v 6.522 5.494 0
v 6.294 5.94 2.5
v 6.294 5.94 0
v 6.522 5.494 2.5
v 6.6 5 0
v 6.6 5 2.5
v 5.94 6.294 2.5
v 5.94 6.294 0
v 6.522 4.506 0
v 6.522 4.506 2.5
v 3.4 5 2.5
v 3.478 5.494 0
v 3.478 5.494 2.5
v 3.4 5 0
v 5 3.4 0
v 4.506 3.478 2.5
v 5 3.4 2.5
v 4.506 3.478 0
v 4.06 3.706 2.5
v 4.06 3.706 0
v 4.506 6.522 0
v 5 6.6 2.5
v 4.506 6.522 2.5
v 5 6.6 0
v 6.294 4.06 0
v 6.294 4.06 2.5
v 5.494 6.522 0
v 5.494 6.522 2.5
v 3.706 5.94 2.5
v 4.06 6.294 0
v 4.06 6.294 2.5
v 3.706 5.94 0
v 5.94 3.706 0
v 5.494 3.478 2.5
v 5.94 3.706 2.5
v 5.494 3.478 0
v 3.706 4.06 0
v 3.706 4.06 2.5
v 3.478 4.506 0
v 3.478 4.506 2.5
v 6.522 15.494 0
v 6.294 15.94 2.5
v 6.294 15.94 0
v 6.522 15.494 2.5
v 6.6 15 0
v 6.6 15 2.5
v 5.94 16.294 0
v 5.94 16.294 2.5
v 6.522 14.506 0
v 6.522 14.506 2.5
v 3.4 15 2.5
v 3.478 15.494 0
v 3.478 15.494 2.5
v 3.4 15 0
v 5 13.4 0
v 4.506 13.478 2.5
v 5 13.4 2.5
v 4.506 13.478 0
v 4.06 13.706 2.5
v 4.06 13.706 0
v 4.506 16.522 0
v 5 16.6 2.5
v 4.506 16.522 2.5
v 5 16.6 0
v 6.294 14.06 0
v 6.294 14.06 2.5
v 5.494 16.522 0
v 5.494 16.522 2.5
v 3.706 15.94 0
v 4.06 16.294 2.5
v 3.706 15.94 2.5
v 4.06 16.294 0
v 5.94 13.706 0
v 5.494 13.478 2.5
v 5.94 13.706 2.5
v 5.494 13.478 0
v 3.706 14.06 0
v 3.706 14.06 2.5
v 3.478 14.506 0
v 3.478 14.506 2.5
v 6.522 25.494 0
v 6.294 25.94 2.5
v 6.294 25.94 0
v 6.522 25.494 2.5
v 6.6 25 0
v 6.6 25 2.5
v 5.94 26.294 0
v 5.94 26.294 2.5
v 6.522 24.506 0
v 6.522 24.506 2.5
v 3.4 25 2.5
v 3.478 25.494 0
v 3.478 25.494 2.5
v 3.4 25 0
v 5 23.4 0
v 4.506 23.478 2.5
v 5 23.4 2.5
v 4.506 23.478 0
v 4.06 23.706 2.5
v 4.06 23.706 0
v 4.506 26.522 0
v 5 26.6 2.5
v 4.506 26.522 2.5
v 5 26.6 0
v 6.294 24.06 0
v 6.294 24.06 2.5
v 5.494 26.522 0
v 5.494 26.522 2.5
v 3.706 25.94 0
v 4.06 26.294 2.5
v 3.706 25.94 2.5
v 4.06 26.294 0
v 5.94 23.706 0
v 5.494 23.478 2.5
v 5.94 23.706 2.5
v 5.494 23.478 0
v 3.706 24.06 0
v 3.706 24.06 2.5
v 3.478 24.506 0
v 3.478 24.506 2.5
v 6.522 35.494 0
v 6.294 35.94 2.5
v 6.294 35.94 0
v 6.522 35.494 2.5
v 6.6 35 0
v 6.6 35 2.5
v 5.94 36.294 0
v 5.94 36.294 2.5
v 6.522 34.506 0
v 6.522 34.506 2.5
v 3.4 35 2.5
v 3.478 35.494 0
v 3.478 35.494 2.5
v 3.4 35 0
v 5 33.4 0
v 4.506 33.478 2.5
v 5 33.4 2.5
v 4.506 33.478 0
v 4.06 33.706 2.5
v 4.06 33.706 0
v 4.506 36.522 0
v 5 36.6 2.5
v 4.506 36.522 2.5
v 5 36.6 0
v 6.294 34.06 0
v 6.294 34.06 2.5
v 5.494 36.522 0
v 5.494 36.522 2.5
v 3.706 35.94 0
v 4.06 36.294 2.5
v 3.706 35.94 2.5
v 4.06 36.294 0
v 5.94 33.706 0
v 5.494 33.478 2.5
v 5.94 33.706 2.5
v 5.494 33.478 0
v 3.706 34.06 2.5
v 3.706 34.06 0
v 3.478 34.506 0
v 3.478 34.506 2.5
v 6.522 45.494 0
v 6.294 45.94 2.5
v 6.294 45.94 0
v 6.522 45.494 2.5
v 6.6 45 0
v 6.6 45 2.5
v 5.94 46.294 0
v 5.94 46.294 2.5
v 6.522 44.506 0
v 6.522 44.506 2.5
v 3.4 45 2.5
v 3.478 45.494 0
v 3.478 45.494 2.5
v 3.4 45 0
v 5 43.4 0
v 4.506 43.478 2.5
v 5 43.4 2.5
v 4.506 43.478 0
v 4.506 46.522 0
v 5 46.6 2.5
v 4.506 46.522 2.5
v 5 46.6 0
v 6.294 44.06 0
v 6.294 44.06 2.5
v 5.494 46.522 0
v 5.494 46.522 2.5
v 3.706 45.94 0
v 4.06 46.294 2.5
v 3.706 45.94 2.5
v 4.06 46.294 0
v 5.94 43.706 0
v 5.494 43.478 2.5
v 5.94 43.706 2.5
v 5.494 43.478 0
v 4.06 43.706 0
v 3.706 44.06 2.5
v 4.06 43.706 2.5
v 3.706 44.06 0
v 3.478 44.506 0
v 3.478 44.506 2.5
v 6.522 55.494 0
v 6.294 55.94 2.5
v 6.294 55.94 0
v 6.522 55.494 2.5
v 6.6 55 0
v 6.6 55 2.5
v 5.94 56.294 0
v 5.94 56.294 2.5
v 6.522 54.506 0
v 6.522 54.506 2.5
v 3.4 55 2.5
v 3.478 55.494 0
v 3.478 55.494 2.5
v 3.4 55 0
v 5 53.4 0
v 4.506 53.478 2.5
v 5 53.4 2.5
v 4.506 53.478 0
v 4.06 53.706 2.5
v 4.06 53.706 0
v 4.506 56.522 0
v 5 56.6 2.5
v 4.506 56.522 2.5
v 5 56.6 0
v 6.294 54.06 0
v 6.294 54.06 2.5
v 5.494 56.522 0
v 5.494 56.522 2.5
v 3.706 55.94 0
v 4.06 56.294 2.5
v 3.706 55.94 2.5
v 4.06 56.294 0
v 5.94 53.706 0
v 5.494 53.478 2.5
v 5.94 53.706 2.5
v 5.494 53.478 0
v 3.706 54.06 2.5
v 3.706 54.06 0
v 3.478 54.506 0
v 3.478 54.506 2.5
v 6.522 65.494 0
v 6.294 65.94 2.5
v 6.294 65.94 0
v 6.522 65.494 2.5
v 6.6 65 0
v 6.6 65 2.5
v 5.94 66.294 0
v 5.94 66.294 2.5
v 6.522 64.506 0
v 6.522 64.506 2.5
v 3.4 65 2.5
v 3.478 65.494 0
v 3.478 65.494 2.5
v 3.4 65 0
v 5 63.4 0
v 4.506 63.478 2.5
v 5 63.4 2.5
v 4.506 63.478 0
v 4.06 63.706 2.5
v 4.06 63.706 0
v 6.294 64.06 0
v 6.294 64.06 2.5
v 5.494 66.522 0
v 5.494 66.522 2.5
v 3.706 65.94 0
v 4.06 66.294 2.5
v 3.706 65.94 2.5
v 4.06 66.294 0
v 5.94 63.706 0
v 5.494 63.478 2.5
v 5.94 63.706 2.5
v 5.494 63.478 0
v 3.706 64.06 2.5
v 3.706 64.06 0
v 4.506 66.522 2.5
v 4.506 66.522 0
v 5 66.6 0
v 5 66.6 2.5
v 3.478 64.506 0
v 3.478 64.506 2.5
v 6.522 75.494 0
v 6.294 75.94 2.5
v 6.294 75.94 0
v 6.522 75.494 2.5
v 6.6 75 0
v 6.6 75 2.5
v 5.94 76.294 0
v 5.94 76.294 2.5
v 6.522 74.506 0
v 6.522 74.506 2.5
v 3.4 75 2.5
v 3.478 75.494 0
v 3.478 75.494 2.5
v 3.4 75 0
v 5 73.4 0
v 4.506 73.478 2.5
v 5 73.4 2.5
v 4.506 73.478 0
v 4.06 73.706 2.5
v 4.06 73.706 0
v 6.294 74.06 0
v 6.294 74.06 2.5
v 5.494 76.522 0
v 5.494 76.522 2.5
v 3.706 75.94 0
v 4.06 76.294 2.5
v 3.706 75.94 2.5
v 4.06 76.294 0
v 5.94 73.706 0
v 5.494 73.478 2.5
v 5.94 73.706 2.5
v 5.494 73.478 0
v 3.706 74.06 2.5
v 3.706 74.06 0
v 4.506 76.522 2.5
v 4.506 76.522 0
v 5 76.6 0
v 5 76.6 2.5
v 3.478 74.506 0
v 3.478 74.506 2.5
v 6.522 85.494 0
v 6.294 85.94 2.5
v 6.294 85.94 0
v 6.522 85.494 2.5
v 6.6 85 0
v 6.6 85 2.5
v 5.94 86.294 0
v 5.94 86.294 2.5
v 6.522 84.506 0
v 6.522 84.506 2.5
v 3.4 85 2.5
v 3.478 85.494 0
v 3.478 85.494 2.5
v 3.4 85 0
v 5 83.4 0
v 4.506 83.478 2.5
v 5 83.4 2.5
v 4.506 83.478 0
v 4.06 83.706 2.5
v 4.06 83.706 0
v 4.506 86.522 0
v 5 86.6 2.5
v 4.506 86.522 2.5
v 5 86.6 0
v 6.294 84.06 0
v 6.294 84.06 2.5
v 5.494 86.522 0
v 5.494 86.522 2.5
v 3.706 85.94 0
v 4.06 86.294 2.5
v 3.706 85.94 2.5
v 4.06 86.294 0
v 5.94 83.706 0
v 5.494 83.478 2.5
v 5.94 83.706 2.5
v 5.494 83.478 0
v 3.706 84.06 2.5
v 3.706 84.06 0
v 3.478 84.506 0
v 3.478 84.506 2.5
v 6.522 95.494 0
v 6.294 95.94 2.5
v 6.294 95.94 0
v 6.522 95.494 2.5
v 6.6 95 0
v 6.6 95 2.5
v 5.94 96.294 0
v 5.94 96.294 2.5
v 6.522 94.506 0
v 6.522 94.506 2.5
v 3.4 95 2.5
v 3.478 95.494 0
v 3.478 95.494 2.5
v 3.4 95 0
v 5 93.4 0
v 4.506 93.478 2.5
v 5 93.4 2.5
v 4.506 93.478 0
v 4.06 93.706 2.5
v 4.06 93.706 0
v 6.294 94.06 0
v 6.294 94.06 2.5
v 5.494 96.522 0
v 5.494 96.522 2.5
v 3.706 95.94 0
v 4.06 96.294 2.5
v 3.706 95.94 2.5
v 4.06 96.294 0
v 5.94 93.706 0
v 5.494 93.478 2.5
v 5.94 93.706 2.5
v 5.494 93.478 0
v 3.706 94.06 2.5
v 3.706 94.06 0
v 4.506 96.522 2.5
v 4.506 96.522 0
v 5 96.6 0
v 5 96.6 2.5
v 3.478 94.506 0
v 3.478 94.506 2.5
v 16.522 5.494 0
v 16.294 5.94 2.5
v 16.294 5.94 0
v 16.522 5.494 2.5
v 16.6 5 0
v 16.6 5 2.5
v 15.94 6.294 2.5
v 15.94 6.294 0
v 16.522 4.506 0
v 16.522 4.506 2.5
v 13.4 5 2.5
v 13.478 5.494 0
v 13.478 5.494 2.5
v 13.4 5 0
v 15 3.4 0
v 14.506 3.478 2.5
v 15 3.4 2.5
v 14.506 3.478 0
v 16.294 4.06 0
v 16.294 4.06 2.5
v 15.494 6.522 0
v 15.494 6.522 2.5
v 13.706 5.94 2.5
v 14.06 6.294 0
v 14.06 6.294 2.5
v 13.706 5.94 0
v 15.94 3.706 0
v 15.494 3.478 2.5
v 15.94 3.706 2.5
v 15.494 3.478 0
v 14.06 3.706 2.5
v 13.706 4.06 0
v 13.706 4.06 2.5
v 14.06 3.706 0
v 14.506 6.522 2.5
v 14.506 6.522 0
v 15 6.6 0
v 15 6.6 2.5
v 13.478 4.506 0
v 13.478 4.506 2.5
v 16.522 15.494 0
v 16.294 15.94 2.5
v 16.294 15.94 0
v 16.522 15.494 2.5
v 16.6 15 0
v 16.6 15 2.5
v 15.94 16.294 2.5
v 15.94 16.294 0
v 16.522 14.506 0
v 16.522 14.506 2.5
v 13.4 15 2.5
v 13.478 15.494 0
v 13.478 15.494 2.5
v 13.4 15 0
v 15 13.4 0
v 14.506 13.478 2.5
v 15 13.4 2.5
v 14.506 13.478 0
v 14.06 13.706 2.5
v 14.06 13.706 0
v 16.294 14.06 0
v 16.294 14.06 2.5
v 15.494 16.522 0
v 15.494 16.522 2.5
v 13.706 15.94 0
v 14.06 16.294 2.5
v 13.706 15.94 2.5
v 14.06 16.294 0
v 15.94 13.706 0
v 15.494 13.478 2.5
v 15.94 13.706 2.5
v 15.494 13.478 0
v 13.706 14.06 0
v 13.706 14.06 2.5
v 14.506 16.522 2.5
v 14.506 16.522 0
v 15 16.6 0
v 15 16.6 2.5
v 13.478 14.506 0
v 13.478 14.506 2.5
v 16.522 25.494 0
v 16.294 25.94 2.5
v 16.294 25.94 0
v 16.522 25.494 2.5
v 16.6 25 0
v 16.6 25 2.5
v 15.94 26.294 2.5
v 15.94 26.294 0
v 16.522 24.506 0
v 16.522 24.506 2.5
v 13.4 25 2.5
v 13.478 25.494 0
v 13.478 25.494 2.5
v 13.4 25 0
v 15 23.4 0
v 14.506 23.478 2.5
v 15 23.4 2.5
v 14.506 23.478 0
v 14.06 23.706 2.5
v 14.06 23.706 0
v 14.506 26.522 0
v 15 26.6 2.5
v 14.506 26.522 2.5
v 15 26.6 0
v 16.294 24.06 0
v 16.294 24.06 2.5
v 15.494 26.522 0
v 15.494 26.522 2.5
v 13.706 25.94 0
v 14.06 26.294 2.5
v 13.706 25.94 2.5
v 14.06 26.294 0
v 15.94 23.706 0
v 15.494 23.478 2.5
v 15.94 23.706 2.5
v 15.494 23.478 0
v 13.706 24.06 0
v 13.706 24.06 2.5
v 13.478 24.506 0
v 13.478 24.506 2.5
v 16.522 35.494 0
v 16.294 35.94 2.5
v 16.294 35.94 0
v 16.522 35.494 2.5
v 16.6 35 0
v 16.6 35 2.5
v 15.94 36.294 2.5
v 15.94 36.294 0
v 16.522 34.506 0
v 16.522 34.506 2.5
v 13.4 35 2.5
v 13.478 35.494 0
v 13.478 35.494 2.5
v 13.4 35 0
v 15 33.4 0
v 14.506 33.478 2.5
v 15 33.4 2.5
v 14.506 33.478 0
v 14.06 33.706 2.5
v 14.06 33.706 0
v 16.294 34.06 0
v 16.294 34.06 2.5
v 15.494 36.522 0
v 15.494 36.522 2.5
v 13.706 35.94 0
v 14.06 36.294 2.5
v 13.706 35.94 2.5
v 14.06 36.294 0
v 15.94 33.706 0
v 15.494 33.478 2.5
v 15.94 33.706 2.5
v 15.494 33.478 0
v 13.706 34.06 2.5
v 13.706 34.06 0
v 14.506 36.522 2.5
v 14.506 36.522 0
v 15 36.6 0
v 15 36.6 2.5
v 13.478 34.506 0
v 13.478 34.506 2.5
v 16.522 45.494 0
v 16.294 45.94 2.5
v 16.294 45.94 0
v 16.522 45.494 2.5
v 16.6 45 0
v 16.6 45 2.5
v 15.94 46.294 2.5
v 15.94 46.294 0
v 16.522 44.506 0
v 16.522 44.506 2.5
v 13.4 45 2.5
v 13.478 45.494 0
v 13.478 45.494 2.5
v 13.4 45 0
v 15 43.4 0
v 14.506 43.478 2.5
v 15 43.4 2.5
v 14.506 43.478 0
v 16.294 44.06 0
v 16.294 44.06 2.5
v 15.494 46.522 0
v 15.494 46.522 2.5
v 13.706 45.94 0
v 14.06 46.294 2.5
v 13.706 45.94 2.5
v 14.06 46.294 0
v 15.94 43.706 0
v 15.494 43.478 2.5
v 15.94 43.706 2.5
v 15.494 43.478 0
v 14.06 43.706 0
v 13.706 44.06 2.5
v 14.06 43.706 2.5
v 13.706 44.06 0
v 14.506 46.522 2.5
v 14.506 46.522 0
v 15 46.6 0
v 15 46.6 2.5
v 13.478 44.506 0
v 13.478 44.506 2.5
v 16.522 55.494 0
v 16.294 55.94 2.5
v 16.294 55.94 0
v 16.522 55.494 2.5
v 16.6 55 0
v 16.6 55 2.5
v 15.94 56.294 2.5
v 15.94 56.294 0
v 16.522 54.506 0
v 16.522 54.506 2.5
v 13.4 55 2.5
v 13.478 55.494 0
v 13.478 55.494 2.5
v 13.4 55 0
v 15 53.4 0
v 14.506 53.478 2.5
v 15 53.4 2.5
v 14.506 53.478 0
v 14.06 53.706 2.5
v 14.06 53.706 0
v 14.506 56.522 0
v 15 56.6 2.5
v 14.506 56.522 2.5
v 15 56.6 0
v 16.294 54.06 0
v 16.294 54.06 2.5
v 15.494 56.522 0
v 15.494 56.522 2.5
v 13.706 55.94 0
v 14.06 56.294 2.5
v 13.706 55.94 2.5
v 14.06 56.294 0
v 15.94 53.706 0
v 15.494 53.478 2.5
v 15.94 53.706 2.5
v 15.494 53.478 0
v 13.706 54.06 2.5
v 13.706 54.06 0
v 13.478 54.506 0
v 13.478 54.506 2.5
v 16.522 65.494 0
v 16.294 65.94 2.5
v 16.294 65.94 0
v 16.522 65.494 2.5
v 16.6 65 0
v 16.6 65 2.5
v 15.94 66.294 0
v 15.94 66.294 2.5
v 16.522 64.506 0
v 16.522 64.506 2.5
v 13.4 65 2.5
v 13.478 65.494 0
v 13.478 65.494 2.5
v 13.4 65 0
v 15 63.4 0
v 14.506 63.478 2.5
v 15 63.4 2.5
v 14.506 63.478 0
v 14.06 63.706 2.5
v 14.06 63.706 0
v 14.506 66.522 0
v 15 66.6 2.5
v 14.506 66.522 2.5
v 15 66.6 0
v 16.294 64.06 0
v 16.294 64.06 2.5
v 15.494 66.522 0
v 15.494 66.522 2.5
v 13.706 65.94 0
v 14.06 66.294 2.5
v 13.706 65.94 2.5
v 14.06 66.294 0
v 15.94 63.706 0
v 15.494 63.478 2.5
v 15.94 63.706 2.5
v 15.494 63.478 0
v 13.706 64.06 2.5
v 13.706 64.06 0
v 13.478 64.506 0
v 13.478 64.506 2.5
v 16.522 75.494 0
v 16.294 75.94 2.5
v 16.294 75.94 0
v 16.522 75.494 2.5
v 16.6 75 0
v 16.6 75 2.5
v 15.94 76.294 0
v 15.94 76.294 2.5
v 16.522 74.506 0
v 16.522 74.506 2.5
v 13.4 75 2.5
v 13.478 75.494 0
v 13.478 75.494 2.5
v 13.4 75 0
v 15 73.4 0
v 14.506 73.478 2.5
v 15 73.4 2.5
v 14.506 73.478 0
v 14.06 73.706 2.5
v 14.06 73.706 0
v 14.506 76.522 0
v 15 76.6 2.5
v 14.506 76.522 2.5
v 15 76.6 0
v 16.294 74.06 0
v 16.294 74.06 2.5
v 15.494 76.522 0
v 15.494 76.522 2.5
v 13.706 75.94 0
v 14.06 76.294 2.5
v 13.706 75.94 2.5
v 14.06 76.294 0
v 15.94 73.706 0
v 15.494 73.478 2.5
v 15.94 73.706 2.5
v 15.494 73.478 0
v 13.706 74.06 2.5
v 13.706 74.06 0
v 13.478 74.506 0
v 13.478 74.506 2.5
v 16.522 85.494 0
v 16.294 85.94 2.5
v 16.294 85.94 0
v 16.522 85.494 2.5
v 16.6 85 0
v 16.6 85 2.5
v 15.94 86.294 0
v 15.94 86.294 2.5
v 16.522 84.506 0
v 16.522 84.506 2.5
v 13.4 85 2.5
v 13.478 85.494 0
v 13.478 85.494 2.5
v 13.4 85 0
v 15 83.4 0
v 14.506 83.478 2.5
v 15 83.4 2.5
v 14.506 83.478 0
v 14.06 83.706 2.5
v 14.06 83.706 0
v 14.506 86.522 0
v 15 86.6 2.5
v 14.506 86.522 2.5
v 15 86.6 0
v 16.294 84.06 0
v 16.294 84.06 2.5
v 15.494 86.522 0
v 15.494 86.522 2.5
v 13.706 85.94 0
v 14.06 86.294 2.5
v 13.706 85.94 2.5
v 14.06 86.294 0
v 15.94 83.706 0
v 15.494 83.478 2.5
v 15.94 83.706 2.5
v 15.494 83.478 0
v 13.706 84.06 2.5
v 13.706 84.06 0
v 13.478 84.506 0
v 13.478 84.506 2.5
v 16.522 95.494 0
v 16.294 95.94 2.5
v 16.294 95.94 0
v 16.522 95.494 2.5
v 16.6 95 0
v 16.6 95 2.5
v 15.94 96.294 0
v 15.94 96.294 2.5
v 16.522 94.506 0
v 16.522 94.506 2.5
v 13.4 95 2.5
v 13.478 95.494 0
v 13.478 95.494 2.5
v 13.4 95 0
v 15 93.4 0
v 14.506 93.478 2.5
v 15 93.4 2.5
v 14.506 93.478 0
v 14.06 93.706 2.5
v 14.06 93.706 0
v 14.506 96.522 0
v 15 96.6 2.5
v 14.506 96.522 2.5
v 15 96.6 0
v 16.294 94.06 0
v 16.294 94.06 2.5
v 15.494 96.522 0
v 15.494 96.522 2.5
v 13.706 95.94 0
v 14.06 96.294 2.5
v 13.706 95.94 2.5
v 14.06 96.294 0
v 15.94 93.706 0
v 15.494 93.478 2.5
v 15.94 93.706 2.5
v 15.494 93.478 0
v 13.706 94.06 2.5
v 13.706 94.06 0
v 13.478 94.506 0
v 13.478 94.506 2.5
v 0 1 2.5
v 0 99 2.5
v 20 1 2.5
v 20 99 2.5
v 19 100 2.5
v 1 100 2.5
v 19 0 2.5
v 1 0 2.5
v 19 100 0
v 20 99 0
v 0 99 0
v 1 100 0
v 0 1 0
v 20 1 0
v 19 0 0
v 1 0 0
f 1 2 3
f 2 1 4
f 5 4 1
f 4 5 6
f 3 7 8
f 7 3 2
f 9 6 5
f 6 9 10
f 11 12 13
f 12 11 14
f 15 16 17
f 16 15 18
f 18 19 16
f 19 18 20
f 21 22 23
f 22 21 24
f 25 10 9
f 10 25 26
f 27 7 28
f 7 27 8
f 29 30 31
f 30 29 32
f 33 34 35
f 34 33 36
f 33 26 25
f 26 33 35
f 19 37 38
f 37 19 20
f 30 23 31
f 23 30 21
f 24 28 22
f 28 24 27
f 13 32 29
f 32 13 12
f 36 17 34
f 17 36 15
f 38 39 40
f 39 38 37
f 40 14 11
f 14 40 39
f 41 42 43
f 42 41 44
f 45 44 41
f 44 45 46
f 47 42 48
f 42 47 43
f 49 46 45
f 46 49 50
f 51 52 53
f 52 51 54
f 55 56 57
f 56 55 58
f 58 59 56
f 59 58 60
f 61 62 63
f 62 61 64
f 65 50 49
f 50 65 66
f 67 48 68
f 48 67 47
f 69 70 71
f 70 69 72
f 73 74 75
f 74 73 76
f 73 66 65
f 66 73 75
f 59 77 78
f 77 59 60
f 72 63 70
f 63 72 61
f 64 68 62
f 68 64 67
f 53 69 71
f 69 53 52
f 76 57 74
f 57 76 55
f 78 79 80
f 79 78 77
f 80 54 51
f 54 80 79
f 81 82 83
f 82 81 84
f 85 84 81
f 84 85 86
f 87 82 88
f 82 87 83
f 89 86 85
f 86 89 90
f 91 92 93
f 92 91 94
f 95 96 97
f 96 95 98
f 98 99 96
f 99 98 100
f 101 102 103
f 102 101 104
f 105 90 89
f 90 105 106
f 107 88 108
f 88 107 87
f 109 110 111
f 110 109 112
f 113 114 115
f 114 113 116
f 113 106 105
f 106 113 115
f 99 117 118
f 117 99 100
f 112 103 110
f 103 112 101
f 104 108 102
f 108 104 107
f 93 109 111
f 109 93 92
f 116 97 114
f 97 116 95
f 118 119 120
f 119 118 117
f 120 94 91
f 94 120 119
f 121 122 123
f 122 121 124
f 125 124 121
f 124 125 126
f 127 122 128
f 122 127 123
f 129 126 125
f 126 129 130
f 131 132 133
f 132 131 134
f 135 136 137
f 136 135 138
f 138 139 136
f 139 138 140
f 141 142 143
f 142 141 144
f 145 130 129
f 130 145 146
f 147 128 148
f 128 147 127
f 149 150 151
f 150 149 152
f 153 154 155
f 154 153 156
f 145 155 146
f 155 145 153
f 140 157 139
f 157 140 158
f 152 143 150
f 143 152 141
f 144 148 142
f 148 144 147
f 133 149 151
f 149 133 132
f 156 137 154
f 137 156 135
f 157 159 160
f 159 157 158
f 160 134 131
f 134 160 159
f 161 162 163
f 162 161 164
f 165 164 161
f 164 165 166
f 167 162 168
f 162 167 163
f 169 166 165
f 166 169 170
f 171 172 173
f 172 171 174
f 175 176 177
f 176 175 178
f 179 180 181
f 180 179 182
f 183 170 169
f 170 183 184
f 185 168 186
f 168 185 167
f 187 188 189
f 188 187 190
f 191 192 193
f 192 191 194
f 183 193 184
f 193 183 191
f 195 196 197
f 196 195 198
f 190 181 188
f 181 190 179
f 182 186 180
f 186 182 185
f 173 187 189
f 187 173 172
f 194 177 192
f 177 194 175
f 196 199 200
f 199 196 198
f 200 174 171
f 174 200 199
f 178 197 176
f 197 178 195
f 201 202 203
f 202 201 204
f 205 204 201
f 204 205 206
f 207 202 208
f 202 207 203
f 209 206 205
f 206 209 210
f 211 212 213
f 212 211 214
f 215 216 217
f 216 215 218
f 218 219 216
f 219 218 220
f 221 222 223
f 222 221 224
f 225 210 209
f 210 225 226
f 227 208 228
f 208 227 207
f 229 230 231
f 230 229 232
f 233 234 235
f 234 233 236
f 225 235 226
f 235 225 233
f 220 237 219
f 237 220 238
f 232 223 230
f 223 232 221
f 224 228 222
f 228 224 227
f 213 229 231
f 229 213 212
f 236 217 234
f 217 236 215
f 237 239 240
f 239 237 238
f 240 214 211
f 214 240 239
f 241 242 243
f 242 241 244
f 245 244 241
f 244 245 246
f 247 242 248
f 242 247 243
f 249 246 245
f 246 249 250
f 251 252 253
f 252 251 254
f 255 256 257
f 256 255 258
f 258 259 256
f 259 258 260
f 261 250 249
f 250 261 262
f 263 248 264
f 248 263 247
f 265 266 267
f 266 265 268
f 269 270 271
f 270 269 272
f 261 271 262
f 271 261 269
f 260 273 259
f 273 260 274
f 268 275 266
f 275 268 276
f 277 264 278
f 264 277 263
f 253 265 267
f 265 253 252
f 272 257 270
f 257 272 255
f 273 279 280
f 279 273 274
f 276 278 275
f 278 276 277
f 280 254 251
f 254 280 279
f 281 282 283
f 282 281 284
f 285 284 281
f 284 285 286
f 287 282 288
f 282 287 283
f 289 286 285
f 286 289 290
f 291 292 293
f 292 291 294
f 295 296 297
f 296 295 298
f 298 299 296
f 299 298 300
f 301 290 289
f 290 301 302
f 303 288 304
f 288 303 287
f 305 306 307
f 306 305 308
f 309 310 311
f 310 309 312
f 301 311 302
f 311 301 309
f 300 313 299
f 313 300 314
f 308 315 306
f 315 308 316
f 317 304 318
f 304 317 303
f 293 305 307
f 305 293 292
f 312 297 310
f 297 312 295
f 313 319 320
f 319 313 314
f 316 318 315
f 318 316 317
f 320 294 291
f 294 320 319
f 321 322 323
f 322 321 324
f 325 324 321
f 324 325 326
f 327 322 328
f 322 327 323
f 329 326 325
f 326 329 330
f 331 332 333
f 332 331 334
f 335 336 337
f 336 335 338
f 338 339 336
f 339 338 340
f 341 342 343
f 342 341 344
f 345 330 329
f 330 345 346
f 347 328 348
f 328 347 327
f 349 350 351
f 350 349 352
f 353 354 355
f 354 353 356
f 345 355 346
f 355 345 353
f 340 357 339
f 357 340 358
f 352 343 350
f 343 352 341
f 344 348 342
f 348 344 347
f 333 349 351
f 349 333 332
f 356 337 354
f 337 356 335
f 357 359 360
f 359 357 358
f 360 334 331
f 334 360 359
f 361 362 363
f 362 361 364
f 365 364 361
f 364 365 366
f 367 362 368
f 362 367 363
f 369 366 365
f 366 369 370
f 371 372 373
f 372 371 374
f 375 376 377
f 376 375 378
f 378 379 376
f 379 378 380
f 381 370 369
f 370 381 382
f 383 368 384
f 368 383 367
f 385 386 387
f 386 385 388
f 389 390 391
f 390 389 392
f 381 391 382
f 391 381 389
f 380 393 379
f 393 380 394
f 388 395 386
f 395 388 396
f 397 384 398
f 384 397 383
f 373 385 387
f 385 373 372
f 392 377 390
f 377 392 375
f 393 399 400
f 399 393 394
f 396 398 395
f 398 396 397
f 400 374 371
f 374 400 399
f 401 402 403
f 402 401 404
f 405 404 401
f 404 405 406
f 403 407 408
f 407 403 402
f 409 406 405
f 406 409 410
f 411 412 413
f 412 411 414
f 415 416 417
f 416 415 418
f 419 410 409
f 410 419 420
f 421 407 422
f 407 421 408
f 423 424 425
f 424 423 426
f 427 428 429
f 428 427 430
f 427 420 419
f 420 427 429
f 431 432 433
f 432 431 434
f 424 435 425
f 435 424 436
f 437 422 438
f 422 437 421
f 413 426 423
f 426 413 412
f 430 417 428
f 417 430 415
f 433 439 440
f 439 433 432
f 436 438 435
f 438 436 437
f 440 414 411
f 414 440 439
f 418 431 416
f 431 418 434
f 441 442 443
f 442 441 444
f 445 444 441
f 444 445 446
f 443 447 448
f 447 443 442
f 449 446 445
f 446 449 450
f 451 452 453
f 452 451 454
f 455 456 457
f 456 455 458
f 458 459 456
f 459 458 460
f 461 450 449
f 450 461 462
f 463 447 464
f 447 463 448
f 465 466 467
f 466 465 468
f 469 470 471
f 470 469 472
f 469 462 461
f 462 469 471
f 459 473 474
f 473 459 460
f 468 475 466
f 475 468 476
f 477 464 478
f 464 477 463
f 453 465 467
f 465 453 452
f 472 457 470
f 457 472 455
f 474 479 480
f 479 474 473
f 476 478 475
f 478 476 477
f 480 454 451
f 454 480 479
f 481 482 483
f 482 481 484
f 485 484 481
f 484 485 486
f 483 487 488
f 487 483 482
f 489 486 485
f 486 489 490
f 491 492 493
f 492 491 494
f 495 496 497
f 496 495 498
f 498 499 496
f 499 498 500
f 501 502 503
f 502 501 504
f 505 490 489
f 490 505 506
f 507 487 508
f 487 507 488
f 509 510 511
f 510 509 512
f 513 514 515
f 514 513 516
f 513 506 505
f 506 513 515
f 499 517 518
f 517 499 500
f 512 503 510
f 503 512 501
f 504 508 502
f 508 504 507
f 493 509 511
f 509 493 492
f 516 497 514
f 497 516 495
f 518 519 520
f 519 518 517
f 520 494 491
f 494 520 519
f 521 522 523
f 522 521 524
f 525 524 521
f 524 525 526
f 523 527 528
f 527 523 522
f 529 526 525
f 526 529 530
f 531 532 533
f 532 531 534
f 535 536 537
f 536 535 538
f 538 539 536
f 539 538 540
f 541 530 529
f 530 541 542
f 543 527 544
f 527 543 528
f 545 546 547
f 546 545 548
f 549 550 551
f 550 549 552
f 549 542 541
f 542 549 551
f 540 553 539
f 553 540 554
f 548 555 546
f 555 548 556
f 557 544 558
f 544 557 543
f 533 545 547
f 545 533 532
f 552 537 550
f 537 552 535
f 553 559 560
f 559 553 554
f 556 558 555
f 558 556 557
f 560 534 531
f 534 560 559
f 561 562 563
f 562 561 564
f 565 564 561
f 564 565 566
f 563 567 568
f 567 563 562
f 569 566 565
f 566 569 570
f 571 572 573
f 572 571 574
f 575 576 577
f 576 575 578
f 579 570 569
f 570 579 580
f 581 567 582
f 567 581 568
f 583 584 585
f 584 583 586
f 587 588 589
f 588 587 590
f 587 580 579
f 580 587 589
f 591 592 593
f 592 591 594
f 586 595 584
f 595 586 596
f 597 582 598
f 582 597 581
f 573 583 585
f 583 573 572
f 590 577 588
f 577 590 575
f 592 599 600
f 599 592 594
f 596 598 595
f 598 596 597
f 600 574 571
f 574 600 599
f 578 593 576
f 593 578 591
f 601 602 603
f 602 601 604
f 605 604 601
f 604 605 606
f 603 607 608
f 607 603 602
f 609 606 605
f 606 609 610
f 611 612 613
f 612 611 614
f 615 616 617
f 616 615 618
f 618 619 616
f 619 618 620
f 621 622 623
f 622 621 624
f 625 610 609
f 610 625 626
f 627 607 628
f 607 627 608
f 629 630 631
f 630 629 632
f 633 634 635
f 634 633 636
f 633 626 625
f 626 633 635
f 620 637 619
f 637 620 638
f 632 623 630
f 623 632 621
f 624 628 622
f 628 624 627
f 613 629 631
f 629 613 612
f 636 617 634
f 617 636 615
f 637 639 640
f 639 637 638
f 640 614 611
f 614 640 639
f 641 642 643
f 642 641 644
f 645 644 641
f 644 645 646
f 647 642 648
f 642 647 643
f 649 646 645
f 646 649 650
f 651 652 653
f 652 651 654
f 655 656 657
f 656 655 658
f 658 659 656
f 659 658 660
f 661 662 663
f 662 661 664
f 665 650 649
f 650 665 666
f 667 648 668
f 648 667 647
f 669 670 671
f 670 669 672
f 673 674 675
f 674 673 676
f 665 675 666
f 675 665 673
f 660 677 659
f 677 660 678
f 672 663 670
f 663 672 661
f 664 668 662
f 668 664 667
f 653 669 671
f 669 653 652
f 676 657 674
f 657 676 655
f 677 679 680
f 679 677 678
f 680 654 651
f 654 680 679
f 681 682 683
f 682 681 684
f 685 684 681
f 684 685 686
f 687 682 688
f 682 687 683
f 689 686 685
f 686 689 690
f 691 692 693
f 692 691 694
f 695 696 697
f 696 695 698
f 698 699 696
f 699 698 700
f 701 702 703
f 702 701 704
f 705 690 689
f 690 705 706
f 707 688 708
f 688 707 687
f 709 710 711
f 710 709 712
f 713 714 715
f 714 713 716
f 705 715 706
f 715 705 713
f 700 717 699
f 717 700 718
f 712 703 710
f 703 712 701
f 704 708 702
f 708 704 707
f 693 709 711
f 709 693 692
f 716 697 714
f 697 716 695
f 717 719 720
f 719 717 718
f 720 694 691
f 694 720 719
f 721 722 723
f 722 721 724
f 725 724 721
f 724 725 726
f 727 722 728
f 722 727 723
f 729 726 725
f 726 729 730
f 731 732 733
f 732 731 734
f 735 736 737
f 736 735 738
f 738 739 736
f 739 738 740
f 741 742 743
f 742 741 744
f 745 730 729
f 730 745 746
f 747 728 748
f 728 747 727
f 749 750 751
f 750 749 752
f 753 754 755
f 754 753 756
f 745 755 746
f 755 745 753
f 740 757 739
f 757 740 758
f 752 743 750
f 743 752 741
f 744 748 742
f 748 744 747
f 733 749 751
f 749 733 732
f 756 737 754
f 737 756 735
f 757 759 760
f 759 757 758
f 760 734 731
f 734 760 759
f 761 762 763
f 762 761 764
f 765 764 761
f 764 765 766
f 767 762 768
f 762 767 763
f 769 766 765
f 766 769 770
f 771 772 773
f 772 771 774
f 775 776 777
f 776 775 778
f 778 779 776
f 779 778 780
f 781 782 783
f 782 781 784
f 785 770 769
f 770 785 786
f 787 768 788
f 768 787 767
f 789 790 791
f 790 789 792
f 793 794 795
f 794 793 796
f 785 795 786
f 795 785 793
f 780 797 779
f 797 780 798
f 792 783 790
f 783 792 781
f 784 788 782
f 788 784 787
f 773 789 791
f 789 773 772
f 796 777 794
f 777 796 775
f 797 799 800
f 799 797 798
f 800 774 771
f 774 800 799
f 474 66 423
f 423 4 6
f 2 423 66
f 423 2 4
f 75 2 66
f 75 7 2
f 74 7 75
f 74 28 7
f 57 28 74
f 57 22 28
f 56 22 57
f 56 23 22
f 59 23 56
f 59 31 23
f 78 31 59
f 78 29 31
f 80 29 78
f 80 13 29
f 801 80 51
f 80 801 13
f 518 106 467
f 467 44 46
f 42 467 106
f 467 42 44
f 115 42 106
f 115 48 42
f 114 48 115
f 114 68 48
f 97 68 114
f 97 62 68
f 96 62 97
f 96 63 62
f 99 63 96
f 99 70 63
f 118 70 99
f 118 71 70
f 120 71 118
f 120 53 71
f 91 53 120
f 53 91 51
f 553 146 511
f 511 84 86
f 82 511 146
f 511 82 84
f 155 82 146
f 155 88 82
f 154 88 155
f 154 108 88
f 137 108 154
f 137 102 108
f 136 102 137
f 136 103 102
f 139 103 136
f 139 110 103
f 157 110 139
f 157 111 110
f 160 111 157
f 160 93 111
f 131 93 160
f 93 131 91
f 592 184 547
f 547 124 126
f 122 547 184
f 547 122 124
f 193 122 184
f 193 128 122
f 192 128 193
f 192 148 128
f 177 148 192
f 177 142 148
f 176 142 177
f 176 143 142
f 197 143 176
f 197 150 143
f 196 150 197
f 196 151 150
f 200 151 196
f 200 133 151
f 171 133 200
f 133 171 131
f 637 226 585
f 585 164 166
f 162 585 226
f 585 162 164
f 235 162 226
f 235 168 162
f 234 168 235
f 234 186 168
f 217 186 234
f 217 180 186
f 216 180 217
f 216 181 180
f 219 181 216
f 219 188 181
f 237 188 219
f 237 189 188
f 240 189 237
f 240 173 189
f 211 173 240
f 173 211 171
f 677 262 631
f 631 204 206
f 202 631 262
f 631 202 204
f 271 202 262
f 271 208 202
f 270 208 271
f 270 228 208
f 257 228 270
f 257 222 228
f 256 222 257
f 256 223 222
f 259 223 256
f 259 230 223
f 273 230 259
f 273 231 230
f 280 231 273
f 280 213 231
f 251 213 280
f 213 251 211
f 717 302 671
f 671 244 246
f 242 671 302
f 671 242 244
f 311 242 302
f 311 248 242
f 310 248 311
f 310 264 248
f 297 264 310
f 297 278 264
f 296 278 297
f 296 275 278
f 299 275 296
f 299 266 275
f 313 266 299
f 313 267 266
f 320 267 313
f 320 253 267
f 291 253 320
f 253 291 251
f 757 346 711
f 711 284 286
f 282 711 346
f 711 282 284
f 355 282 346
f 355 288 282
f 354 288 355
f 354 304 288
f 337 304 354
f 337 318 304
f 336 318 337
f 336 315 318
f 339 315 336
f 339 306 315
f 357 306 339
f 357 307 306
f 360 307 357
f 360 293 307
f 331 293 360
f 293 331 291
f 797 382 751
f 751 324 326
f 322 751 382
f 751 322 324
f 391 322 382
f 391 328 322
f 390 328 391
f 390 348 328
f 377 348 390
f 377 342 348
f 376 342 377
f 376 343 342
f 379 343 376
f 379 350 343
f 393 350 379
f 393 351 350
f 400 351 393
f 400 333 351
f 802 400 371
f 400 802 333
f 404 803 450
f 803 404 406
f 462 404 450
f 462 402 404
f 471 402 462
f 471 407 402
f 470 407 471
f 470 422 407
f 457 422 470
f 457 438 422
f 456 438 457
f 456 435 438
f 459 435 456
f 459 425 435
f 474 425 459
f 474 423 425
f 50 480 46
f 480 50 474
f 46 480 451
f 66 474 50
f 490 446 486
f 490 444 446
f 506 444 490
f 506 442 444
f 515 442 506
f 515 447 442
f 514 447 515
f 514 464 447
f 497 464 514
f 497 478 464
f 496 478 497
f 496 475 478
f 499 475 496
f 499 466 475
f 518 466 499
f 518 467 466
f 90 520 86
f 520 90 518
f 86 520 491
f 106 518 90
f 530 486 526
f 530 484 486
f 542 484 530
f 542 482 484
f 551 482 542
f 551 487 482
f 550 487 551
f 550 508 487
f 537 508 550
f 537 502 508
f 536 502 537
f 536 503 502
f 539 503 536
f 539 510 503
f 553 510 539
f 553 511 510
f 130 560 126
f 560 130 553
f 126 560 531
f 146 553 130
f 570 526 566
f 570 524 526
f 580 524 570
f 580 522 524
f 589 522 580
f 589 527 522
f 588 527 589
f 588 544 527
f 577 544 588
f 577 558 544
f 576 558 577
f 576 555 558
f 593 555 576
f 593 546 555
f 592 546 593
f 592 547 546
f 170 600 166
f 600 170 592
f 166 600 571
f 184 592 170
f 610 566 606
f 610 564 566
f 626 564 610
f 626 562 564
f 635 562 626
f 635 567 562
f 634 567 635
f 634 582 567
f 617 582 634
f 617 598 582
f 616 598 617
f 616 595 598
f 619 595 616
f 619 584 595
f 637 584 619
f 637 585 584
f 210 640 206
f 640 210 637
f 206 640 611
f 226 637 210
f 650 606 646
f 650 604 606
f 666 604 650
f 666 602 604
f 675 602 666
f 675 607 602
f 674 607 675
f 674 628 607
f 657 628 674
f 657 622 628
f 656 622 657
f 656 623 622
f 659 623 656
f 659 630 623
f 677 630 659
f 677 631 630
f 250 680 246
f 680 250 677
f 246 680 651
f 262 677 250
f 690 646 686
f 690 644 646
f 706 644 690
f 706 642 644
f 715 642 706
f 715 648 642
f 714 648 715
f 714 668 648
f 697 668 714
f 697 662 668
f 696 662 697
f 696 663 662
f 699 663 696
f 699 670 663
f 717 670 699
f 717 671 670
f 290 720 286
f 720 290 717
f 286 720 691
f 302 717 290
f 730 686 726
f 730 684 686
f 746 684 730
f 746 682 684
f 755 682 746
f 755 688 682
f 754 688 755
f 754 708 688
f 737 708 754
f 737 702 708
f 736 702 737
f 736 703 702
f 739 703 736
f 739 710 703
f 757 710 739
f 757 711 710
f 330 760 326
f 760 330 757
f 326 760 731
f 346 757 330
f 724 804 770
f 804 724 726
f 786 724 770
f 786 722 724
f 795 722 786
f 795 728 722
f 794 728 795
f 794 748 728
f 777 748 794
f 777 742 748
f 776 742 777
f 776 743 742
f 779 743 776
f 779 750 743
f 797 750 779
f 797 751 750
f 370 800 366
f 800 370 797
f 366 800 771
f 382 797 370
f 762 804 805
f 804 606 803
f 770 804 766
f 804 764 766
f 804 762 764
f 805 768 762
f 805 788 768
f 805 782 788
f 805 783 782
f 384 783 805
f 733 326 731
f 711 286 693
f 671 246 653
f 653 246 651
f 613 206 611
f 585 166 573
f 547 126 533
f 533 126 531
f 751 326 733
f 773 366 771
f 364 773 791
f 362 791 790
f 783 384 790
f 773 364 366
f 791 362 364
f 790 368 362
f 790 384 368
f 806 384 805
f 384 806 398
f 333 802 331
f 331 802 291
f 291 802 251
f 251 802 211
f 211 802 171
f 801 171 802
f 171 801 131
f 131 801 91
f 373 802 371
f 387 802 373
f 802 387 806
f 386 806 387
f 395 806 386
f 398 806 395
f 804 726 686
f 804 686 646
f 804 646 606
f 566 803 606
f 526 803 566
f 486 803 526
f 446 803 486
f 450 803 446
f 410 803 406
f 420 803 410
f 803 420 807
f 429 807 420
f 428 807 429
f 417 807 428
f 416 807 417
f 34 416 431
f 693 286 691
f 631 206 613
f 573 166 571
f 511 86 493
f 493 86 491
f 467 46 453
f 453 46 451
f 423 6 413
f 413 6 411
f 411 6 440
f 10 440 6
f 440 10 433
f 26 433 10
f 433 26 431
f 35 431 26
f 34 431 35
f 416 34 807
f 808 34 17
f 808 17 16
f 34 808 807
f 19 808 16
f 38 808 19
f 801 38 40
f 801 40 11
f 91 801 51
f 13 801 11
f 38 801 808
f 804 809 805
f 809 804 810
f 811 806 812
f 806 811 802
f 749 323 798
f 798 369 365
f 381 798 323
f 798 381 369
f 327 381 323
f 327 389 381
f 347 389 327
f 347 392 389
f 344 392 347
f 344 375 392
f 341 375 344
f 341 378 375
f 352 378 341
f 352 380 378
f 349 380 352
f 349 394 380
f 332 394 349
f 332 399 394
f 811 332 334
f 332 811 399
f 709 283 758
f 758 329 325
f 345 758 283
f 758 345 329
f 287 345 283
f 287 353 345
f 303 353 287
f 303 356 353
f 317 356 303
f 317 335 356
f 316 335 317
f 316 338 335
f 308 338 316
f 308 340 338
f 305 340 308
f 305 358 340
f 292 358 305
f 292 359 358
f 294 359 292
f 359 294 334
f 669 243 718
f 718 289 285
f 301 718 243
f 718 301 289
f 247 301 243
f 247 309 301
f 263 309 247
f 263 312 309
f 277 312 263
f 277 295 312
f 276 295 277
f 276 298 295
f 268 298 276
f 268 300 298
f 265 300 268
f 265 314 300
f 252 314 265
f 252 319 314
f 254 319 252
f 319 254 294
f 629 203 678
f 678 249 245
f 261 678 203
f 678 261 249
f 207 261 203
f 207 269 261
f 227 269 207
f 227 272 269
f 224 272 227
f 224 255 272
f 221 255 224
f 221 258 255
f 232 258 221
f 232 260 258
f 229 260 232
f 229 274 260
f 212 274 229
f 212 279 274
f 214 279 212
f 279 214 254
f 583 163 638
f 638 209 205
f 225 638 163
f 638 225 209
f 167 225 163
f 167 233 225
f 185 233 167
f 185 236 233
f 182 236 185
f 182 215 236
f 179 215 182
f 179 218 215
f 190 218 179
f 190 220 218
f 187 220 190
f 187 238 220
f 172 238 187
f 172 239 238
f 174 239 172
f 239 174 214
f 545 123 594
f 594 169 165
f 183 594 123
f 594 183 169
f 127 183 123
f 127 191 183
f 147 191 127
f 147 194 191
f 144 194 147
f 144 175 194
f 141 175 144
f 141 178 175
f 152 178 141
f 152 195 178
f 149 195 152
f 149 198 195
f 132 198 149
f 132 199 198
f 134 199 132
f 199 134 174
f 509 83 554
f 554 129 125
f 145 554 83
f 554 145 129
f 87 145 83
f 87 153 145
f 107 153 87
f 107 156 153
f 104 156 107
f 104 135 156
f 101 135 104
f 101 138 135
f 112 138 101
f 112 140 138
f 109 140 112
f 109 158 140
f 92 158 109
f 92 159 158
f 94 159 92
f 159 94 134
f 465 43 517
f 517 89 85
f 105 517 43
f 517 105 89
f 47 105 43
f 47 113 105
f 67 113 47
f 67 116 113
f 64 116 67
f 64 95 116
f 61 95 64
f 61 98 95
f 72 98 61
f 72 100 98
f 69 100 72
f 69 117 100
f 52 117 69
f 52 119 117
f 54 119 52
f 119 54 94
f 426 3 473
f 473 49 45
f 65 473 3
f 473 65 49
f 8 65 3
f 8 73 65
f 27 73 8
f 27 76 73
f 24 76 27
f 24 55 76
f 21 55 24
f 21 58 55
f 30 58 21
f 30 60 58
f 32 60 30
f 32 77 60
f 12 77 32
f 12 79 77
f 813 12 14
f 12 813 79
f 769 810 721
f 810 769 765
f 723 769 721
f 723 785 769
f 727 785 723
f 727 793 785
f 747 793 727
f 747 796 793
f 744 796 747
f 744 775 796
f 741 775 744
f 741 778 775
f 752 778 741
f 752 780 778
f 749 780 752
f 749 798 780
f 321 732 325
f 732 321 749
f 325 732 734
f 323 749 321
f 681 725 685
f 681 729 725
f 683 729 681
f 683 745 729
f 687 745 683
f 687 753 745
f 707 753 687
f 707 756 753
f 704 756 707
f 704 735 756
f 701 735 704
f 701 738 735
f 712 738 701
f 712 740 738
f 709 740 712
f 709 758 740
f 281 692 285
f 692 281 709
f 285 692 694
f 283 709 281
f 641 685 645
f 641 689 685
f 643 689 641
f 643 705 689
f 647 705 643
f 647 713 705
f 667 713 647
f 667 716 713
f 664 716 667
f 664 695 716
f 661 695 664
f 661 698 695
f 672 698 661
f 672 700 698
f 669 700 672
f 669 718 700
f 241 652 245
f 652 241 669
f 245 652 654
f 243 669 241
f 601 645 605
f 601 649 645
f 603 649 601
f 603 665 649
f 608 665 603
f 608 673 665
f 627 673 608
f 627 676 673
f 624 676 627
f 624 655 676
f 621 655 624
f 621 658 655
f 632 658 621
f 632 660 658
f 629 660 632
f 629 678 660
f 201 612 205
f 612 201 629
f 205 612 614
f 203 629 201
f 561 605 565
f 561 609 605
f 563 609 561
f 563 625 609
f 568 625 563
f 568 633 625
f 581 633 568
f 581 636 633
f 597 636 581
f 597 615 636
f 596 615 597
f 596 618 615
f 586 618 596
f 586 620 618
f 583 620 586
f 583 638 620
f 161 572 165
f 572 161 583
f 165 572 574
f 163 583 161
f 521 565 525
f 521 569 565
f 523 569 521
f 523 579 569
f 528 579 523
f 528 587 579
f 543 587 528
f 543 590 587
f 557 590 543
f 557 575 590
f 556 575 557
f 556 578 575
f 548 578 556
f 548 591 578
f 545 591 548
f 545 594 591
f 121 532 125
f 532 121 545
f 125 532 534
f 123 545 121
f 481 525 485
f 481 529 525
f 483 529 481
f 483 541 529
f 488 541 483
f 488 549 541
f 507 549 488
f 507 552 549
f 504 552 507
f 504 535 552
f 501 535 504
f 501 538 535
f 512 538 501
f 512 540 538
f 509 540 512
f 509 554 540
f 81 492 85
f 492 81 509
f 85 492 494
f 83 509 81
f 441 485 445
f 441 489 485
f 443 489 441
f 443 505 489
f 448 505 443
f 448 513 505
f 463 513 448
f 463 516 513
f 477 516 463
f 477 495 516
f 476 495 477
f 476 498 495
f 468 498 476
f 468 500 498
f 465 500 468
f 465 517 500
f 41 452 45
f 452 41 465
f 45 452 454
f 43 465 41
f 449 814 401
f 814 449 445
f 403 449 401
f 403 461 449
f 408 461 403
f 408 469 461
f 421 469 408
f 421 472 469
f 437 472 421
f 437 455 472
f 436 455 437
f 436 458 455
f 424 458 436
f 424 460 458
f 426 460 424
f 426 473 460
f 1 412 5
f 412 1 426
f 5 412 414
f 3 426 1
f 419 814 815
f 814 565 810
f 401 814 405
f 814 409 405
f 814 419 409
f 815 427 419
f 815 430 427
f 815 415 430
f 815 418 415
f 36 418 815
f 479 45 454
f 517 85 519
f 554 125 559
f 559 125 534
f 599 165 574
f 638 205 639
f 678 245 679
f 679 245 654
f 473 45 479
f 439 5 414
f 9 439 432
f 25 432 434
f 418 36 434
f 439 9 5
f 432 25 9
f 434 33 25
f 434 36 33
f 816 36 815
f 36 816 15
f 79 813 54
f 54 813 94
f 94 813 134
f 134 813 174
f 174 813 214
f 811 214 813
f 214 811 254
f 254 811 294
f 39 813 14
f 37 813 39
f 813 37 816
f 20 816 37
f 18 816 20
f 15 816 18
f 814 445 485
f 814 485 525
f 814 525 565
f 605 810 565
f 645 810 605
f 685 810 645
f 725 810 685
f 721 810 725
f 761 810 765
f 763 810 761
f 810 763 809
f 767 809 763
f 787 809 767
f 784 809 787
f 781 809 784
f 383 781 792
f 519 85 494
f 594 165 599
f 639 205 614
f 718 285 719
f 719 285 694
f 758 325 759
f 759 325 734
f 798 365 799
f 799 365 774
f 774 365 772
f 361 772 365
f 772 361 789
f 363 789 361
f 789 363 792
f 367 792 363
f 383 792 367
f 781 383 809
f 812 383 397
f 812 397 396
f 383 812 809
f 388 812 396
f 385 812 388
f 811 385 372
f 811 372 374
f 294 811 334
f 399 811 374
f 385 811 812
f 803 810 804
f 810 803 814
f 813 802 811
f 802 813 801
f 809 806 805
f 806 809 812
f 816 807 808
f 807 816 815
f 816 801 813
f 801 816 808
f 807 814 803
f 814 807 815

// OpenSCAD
N = 2;
M = 10;
HOLE_DIAMETER = 3.2;

width = 10*N;
length = 10*M;

CHAMFER = 1;
tall = 2.5;


A= CHAMFER*-1;
B= CHAMFER*2;
difference(){
    cube([width,length, 2.5]);
    for(i = [0:N-1]){
        for(j = [0:M-1]){
            translate([5+(10*i),5+(10*j),0]){
                cylinder(h = 10, d = HOLE_DIAMETER, center = true, $fn = 20);
            }
        }
    }
    
    linear_extrude(height = tall*2, center = true){
        polygon(points=[[A,A],[A,B],[B,A]]);
    }
    
    
    translate([width,0,tall]){
        rotate(180,[0,-1,0]){
            linear_extrude(height = tall*2,center = true){
                polygon(points=[[A,A],[A,B],[B,A]]);
            }
        }
    }
    
    translate([width,length,0]){
        rotate(180,[0,0,1]){
            linear_extrude(height = tall*2,center = true){
                polygon(points=[[A,A],[A,B],[B,A]]);
            }
            
            translate([width,0,tall]){
                rotate(180,[0,-1,0]){
                    linear_extrude(height = tall*2, center = true){
                        polygon(points=[[A,A],[A,B],[B,A]]);
                    }
                }
            }
        }
    }

}
